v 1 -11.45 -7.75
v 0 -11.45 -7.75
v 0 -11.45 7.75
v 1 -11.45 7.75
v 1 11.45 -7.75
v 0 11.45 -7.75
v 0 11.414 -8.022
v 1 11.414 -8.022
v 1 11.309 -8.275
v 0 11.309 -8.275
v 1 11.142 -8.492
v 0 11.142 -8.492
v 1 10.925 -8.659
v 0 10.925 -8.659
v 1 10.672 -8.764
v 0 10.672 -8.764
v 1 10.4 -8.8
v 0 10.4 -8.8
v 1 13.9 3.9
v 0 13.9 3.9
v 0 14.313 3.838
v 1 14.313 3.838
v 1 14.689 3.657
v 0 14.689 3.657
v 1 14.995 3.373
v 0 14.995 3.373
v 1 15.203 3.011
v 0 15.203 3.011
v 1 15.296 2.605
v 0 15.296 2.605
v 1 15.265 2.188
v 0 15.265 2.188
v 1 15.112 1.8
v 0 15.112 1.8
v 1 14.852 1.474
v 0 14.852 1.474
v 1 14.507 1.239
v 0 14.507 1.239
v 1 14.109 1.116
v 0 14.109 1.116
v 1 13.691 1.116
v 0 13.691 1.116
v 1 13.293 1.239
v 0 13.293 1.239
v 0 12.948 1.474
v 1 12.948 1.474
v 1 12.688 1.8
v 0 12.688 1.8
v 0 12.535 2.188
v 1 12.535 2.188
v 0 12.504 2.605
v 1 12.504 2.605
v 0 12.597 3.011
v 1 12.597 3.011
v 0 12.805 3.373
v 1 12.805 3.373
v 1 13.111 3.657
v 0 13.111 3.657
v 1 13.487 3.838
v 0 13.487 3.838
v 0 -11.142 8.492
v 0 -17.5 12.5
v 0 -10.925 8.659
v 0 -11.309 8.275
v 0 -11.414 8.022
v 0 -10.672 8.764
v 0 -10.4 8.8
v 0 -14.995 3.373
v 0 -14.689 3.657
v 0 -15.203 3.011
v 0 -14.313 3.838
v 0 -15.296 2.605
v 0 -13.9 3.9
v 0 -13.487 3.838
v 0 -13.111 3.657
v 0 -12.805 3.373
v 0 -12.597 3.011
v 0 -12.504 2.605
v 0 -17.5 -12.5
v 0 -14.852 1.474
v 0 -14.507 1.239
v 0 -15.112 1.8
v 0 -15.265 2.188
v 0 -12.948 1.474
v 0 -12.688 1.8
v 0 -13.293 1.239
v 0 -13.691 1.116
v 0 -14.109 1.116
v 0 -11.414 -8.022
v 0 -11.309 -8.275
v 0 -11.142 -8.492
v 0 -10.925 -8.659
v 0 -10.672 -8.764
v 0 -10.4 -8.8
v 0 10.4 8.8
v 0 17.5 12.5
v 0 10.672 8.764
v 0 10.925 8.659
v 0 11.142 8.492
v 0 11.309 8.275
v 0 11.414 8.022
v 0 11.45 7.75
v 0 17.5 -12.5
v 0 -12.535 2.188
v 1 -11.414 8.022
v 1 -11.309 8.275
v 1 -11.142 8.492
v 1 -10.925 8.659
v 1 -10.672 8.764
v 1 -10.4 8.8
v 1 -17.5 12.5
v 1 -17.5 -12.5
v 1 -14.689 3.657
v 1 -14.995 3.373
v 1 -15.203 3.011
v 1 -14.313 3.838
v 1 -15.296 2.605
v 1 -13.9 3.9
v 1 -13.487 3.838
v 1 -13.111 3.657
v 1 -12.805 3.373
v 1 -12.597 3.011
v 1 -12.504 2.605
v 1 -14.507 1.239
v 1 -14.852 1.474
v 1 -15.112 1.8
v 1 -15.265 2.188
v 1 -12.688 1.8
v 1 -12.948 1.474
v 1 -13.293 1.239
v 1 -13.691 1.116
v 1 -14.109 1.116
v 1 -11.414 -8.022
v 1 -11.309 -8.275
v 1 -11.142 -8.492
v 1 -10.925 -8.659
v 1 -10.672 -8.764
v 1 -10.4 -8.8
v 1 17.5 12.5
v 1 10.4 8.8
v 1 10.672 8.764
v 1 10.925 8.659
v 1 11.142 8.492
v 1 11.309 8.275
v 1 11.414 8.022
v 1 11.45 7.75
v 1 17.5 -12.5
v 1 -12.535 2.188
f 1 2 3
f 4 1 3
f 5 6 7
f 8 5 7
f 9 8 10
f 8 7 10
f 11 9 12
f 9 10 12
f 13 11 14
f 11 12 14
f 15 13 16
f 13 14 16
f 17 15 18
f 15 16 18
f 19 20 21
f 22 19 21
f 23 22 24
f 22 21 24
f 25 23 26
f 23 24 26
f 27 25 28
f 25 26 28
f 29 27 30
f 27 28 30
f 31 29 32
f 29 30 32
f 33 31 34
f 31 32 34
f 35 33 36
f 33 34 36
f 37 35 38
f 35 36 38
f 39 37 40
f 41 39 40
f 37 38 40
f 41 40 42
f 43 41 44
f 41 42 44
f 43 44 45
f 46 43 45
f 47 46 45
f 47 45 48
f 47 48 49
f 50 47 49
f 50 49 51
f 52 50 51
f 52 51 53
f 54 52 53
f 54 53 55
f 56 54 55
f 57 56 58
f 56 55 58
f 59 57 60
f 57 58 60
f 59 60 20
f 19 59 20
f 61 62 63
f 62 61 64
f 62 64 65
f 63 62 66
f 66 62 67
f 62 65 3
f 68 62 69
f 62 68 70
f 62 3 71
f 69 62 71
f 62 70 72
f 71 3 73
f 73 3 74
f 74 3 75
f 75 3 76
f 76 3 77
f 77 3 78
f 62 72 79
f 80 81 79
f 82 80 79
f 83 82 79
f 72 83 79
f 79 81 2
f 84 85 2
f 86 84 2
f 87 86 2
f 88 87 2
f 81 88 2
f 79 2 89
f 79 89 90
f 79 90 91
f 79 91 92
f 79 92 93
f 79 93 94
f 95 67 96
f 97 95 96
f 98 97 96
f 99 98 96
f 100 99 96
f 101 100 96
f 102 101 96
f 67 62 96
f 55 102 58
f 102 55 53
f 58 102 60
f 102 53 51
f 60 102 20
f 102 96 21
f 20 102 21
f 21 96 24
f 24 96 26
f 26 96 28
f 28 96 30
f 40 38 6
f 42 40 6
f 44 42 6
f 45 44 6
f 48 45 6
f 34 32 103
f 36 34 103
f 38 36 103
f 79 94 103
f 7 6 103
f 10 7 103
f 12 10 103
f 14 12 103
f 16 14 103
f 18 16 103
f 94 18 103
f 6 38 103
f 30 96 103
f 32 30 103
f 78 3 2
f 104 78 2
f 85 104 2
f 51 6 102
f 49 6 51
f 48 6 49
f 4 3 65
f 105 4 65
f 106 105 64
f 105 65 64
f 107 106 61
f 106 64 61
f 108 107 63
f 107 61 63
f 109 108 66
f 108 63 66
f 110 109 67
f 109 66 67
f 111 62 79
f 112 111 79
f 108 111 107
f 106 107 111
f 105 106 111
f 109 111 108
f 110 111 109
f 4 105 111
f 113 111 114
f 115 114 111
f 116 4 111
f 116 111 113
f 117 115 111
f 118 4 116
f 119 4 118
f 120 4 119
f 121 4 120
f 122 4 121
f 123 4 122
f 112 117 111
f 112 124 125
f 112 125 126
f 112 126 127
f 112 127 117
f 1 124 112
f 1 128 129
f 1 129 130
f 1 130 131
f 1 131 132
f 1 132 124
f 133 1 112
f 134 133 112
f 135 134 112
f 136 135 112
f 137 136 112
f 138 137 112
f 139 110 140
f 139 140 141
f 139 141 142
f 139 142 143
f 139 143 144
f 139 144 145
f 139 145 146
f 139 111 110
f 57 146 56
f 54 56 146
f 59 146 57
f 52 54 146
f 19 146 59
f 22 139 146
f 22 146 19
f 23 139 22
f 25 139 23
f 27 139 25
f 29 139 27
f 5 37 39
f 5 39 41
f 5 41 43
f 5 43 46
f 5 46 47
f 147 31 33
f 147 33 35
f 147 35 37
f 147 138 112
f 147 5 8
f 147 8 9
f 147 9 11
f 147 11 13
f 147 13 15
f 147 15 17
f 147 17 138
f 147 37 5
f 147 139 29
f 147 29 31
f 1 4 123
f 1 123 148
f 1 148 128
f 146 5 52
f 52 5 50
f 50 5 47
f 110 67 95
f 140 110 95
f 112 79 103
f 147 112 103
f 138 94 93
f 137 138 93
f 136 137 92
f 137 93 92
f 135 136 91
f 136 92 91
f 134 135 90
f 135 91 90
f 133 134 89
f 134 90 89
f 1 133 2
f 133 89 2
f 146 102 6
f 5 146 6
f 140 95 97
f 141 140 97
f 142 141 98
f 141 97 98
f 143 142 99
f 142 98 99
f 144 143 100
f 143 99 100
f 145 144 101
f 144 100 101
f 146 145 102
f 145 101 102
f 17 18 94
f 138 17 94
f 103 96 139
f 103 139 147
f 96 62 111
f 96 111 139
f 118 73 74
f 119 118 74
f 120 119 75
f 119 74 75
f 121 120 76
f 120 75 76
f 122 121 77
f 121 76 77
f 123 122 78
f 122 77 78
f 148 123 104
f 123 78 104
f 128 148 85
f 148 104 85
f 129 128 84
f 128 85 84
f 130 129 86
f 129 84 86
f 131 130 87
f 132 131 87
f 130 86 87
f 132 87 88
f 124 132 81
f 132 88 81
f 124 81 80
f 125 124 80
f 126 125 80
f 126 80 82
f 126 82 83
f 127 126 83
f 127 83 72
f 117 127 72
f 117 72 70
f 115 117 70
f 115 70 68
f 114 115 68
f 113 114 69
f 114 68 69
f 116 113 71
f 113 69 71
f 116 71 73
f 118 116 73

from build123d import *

# Parameters (mm, degrees)
SKETCH1_W           = 25
SKETCH1_H           = 35
BOSS_EXTRUDE1_DEPTH = 1
SKETCH2_R           = 1.4
CUT_EXTRUDE1_DEPTH  = 1


with BuildPart() as part:
    # Sketch1 → Boss-Extrude1 (new body)
    with BuildSketch(Plane(origin=(0, 0, 0), x_dir=(0, 0, -1), z_dir=(1, 0, 0))):
        Rectangle(SKETCH1_W, SKETCH1_H)
    extrude(amount=BOSS_EXTRUDE1_DEPTH)

    # Sketch2 → Cut-Extrude1 (cut)
    with BuildSketch(Plane.ZY):
        with Locations((2.5, 13.9)):
            Circle(SKETCH2_R)
        with Locations((2.5, -13.9)):
            Circle(SKETCH2_R)
        with BuildLine():
            Line((-8.8, 10.4), (-8.8, -10.4))
            ThreePointArc((-8.8, -10.4), (-8.49246212, -11.14246212), (-7.75, -11.45))
            Line((-7.75, -11.45), (7.75, -11.45))
            ThreePointArc((7.75, -11.45), (8.49246212, -11.14246212), (8.8, -10.4))
            Line((8.8, -10.4), (8.8, 10.4))
            ThreePointArc((8.8, 10.4), (8.49246212, 11.14246212), (7.75, 11.45))
            Line((7.75, 11.45), (-7.75, 11.45))
            ThreePointArc((-7.75, 11.45), (-8.49246212, 11.14246212), (-8.8, 10.4))
        make_face()
    extrude(amount=-CUT_EXTRUDE1_DEPTH, mode=Mode.SUBTRACT)


solid = part.part
